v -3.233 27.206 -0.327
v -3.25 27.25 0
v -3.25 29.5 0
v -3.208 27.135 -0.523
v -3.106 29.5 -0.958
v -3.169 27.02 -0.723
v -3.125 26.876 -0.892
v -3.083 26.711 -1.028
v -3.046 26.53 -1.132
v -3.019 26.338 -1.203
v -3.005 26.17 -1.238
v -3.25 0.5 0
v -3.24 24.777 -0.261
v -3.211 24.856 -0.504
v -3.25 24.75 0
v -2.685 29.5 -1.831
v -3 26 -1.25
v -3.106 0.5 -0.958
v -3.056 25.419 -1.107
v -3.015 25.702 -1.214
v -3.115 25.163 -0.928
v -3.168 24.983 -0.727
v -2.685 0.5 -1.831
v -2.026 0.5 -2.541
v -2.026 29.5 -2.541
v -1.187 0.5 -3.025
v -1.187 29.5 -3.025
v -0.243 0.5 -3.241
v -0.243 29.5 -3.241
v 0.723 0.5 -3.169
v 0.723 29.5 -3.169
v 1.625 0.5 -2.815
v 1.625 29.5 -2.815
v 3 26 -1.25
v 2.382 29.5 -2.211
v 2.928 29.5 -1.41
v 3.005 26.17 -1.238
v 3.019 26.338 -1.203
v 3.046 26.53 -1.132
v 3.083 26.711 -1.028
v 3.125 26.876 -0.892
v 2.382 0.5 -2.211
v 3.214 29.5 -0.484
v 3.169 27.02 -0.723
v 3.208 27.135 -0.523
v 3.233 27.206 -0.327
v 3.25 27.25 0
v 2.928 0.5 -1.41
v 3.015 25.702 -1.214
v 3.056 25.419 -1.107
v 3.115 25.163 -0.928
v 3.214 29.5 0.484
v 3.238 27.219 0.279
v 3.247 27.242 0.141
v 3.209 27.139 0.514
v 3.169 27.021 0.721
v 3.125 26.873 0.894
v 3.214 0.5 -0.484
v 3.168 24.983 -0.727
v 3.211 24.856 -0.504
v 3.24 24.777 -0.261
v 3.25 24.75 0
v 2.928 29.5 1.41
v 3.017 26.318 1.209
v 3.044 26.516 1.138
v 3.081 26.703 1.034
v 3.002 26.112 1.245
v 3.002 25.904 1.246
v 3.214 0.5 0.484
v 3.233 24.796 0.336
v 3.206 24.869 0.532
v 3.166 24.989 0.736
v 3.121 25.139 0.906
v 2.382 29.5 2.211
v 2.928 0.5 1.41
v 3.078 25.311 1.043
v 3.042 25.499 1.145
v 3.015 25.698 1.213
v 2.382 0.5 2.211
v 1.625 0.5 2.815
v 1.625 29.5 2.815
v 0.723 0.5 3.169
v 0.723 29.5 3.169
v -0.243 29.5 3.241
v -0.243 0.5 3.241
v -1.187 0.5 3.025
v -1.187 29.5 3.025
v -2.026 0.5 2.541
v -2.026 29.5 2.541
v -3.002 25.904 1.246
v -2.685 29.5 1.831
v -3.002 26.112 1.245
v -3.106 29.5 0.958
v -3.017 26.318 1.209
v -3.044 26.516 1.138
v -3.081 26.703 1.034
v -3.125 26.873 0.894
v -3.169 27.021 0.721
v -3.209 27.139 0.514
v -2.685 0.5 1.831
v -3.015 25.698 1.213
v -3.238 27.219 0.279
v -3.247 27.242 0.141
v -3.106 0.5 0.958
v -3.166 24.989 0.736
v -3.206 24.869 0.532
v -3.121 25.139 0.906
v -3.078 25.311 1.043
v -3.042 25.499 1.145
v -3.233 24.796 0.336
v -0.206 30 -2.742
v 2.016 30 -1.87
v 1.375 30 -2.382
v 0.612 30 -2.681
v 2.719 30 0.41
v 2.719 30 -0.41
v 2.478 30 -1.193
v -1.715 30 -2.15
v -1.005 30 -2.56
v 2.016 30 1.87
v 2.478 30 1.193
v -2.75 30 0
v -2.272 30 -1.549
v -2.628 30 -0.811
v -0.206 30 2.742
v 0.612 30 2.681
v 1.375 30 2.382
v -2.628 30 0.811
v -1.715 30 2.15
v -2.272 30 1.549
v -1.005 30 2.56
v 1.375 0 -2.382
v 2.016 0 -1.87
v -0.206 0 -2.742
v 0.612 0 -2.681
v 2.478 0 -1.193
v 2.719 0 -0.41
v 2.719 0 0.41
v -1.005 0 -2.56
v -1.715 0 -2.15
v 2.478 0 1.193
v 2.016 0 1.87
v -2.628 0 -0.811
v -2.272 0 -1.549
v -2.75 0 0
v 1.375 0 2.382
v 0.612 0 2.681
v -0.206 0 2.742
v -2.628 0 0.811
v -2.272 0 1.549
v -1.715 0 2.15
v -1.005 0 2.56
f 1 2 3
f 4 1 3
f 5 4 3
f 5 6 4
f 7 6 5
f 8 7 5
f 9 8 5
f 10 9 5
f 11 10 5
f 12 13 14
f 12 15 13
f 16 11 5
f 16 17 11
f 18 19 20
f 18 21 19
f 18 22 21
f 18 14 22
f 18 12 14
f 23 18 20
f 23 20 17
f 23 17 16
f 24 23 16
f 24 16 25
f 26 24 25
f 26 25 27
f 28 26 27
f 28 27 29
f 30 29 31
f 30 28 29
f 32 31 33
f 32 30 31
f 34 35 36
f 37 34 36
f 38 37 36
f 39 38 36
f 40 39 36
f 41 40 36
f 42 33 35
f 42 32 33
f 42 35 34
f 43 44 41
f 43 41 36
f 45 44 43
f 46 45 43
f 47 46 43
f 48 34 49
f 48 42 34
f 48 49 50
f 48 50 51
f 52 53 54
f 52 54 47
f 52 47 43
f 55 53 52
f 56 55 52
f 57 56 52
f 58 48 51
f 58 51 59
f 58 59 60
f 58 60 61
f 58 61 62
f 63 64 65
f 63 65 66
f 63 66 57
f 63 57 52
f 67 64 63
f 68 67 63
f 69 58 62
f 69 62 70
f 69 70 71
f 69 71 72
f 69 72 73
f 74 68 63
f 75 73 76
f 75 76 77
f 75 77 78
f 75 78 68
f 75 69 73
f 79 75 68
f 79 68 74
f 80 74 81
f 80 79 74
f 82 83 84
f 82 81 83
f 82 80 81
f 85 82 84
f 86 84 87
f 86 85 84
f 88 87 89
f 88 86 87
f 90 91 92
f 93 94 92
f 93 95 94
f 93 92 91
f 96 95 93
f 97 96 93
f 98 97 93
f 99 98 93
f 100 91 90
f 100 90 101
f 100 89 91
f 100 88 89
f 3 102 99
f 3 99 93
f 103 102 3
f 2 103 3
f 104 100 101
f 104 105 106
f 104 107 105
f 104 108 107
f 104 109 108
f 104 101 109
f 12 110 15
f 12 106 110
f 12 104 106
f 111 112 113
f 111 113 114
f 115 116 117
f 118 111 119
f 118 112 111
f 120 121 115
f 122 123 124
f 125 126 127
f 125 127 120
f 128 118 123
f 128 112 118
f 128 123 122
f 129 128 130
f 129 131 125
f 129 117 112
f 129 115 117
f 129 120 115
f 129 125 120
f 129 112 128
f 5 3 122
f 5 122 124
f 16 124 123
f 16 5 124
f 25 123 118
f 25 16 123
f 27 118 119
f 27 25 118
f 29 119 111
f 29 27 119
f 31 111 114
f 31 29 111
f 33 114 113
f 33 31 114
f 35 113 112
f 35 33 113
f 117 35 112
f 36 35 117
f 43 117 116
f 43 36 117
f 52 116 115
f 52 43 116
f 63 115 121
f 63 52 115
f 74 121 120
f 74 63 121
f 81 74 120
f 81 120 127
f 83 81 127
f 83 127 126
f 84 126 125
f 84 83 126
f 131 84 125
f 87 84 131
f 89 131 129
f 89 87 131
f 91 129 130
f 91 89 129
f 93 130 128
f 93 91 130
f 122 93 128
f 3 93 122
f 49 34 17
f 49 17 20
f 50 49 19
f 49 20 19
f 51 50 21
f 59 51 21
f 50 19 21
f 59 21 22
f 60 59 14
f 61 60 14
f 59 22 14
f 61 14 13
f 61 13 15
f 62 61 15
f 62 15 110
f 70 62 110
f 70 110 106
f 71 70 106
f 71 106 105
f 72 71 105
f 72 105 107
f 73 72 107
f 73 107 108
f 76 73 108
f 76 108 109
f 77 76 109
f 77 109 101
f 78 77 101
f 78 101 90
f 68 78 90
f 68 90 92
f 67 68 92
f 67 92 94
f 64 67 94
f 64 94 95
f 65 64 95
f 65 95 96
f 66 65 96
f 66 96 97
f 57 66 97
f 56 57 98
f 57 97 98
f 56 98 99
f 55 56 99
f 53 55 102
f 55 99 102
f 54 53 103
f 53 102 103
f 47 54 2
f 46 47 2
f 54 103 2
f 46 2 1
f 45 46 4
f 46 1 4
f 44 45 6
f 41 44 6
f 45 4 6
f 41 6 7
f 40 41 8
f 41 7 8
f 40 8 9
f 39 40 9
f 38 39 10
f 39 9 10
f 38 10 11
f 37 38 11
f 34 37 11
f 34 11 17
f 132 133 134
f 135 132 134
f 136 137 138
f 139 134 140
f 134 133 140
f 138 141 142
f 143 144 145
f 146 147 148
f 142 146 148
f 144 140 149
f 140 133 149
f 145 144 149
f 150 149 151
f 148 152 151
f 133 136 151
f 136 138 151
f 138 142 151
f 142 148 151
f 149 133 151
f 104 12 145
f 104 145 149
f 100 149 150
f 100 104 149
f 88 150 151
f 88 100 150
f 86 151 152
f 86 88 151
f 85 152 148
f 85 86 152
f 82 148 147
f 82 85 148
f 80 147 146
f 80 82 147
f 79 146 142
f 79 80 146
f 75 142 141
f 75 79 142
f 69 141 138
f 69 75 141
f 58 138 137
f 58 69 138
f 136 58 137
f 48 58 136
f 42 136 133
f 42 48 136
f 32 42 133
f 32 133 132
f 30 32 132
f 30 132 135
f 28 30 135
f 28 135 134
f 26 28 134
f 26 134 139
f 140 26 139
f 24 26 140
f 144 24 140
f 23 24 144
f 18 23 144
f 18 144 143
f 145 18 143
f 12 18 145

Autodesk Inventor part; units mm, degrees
ref_plane "XZ Plane" through (0, 0, 0) normal (0, 1, 0) x (-1, 0, 0)
ref_plane "XY Plane" through (0, 0, 0) normal (0, 0, 1) x (1, 0, 0)
sketch "Skizze1" plane through (0, 0, 0) normal (0, 1, 0) x (-1, 0, 0)
  circle A0 centre (0, 0) radius 3.25
  dimension "d0" = 6.5
extrude "Extrusion1" add sketch "Skizze1" along normal blind 30
chamfer "Fasen1" distance 0.5 angle 45 2 edges at (3.25, 30, 0) (3.25, 0, 0)
ref_plane "Arbeitsebene1" through (3.25, 0, 0) normal (1, 0, 0) x (0, 1, 0)
sketch "Skizze2" plane through (3.25, 0, 0) normal (1, 0, 0) x (0, 1, 0)
  line L0 (0, -2.75) -> (0, 2.75) projected
  line L1 (30, 2.75) -> (30, -2.75) projected
  point P0 (0, 0)
  point P1 (26, 0)
  point P2 (0, 0)
  dimension "d8" = 4
hole "Bohrung1" at (3.25, 26, 0) direction (-1, 0, 0) diameter 2.5 end through all
properties part number "BMS_bolts" material "Edelstahl"
